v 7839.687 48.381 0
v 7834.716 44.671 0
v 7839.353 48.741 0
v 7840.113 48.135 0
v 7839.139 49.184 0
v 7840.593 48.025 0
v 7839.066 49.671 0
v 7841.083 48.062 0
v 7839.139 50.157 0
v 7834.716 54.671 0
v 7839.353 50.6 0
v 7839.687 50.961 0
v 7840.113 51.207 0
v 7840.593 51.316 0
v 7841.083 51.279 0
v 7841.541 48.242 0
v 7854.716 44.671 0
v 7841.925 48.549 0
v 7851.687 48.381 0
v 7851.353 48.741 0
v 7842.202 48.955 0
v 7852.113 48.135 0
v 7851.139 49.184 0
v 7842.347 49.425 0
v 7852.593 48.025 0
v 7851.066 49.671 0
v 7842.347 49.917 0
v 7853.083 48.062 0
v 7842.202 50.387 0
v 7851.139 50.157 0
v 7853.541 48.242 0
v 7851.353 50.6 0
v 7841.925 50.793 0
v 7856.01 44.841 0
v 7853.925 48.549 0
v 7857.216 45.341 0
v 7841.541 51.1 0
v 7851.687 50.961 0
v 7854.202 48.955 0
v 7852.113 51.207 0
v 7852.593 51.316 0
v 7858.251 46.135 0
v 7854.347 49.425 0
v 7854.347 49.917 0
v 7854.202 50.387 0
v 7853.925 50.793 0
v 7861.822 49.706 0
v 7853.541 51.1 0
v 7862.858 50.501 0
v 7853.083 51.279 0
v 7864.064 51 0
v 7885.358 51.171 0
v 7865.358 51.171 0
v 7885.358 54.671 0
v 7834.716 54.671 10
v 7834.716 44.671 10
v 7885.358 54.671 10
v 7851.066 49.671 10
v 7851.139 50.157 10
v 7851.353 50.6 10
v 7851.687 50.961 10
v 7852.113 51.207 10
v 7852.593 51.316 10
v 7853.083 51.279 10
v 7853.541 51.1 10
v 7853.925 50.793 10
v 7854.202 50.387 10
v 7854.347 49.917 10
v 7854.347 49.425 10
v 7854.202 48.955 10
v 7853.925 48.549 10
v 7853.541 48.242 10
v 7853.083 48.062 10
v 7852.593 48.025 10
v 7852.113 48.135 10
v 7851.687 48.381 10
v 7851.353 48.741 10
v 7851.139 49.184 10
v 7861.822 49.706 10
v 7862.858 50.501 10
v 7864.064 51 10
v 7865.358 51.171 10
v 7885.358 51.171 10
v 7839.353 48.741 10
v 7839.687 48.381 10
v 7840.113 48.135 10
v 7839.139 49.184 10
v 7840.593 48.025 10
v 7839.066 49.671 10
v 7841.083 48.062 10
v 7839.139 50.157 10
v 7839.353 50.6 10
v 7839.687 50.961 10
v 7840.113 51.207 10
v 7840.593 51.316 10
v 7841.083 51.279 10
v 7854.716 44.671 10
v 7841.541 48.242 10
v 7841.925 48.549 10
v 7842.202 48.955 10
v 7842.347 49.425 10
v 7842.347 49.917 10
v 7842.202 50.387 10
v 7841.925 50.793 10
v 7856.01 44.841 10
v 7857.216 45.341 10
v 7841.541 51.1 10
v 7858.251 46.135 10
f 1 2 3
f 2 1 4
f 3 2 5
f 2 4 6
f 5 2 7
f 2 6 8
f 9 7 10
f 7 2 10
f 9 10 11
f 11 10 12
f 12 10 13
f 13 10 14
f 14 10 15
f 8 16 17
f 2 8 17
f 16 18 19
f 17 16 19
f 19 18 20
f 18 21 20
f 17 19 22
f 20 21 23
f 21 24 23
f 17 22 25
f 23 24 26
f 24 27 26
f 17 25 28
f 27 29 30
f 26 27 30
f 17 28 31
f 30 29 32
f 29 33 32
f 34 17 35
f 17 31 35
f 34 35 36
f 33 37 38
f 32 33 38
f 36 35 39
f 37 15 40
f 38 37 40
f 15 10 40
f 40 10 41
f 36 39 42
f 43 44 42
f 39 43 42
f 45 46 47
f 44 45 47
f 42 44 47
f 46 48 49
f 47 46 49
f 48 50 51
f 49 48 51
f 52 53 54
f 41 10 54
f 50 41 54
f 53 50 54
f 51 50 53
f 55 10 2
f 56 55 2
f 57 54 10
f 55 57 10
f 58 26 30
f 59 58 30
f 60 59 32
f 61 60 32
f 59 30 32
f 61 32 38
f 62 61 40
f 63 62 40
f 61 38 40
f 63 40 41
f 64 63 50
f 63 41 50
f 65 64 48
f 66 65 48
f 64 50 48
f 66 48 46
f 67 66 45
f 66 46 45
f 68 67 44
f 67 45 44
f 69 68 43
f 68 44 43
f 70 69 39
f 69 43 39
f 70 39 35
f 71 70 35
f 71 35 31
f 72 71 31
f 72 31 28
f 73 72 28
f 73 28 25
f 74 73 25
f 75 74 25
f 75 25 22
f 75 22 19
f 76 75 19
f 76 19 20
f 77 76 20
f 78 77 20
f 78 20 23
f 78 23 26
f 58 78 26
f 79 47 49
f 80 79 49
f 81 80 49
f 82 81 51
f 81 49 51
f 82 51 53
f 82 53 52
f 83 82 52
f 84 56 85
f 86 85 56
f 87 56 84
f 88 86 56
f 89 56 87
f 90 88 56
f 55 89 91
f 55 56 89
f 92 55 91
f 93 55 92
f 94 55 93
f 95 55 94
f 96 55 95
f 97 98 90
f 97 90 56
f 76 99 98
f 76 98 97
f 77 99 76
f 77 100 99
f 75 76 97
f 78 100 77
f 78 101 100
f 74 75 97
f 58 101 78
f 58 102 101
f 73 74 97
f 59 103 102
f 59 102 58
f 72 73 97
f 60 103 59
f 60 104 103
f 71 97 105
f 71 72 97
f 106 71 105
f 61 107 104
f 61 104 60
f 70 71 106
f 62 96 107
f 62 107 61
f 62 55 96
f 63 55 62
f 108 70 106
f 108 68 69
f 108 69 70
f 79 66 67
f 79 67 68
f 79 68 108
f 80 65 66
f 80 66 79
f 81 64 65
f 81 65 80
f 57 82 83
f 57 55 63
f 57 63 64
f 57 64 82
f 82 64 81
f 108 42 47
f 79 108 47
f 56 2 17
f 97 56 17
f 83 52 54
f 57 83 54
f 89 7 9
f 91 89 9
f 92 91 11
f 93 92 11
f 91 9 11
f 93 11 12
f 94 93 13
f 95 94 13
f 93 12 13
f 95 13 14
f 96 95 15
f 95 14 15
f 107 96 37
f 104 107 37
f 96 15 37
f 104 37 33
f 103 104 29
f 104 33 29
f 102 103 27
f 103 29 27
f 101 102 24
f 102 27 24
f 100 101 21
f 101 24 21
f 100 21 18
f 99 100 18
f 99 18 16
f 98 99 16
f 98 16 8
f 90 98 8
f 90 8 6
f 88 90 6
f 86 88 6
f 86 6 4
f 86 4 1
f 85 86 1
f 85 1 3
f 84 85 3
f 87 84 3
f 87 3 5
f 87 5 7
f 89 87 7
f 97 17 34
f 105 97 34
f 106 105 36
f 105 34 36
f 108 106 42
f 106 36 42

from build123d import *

# Parameters (mm, degrees)
EXTRUDE_1_DEPTH    = 10
HOLE_WIZARD_M4_1_D = 3.3


with BuildPart() as part:
    # 草图5 → 凸台-拉伸1 (new body)
    with BuildSketch(Plane.XY):
        with BuildLine():
            Line((7834.715889536, 44.670845652), (7854.715889536, 44.670845652))
            ThreePointArc((7854.715889536, 44.670845652), (7856.629306698, 45.05144799), (7858.251423442, 46.135311746))
            Line((7858.251423442, 46.135311746), (7861.822491254, 49.706379558))
            ThreePointArc((7861.822491254, 49.706379558), (7863.444607998, 50.790243315), (7865.358025159, 51.170845652))
            Line((7865.358025159, 51.170845652), (7885.358025159, 51.170845652))
            Line((7885.358025159, 51.170845652), (7885.358025159, 54.670845652))
            Line((7885.358025159, 54.670845652), (7834.715889536, 54.670845652))
            Line((7834.715889536, 54.670845652), (7834.715889536, 44.670845652))
        make_face()
    extrude(amount=EXTRUDE_1_DEPTH)

    # M4 螺纹孔1 (through all)
    with Locations(Plane.XY.offset(10)):
        with Locations((7840.715889536, 49.670845652), (7852.715889536, 49.670845652)):
            Hole(HOLE_WIZARD_M4_1_D / 2)


solid = part.part
